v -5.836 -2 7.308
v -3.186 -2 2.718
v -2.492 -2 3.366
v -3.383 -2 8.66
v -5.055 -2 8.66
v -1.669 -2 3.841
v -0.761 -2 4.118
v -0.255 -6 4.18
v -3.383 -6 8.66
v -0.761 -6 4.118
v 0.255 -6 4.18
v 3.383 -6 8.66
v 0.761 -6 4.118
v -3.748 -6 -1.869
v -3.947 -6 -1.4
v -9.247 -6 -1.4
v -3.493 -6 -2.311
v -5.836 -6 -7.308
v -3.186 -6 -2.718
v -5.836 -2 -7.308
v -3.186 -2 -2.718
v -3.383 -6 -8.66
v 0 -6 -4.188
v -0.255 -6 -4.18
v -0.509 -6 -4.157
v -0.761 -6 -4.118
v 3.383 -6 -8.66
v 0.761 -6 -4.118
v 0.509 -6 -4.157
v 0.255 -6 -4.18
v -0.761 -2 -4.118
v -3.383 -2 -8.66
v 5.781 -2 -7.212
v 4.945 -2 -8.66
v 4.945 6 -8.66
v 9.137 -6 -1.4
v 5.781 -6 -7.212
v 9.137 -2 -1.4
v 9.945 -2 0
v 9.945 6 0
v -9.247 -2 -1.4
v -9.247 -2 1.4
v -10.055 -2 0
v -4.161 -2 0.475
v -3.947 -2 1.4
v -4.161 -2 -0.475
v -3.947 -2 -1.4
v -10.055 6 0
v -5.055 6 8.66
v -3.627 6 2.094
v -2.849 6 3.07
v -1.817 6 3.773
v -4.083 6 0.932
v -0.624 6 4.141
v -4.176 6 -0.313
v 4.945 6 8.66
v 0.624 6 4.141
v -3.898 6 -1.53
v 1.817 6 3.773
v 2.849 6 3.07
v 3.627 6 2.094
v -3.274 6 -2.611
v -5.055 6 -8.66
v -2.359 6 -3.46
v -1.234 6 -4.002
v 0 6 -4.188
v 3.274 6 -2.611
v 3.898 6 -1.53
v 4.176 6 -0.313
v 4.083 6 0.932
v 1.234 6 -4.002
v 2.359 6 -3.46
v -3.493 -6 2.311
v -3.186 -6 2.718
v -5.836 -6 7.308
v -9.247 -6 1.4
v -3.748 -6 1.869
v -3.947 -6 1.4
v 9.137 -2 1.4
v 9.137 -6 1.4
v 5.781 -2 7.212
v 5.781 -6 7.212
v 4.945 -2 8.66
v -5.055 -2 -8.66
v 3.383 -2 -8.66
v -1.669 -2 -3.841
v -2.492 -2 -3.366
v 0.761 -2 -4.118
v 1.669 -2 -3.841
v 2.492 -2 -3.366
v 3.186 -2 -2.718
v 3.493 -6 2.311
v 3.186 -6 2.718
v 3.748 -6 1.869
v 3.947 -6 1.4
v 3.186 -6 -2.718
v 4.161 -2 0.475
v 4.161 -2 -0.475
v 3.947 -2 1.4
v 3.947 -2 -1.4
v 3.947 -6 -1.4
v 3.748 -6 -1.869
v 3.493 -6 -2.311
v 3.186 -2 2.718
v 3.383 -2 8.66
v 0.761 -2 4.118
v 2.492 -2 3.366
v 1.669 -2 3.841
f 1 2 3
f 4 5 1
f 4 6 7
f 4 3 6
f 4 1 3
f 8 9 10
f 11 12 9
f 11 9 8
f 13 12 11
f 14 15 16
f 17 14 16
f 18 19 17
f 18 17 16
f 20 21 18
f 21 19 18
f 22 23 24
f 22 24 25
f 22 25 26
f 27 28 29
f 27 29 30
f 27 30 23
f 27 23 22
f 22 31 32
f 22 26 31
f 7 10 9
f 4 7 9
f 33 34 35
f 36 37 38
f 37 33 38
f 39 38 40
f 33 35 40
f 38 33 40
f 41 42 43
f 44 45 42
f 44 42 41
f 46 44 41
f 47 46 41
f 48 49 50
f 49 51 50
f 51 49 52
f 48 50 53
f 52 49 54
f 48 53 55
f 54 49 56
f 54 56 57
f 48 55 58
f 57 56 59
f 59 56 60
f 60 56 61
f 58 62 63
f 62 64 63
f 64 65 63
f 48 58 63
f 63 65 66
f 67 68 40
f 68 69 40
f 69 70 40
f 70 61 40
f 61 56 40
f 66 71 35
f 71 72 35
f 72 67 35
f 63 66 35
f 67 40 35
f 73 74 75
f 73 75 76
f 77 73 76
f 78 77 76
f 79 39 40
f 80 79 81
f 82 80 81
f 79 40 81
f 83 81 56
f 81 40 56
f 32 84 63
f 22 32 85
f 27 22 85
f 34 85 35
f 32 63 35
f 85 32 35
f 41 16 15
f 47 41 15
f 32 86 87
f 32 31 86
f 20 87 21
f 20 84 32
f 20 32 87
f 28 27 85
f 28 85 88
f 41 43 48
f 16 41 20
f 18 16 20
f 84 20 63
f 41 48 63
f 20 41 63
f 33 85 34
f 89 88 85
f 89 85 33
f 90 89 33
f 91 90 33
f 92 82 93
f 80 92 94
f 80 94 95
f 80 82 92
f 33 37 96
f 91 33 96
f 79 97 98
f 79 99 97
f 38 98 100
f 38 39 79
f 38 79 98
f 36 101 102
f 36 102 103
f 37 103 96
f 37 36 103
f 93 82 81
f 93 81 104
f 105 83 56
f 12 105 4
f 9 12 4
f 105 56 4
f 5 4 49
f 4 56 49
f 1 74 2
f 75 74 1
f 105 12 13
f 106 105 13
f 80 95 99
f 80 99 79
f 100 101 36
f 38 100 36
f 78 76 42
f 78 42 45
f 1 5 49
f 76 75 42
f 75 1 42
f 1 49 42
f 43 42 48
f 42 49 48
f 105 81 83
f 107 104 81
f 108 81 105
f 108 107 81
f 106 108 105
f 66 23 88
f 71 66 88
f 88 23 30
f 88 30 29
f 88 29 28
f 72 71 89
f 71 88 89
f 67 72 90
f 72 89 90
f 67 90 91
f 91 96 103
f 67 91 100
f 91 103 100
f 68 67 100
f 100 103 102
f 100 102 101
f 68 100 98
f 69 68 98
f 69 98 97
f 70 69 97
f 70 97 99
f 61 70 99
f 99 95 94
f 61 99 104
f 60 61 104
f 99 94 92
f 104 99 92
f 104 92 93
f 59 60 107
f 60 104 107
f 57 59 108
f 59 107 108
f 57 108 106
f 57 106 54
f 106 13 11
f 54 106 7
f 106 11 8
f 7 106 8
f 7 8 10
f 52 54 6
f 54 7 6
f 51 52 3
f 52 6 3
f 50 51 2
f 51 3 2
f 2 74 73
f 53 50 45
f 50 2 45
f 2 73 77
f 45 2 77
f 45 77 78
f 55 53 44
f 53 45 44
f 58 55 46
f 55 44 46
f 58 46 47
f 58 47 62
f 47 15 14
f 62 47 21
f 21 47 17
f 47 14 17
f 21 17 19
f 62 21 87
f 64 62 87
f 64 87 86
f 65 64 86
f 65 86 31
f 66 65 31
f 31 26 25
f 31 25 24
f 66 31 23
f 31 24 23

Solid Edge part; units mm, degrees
sketch "Sketch1" plane through (0, 0, 0) normal (0, -1, 0) x (1, 0, 0)
  line L0 (-5.0552, -8.6603) -> (4.9448, -8.6603)
  line L1 (4.9448, -8.6603) -> (9.9448, 0)
  line L2 (9.9448, 0) -> (4.9448, 8.6603)
  line L3 (4.9448, 8.6603) -> (-5.0552, 8.6603)
  line L4 (-5.0552, 8.6603) -> (-10.0552, 0)
  line L5 (-10.0552, 0) -> (-5.0552, -8.6603)
extrude "Protrusion1" add sketch "Sketch1" along normal mid plane 12
hole "Hole_1" at (0, -6, 0) direction (0, 1, 0) diameter 8.376 end up to next thread major 10 thread length 2
sketch "Sketch2" plane through (-0.0552, -6, 0) normal (0, -1, 0) x (1, 0, 0)
  line L0 (-14.8325, -1.4) -> (22.8043, -1.4)
  line L1 (22.8043, 1.4) -> (22.8043, -1.4)
  line L2 (-14.8325, 1.4) -> (22.8043, 1.4)
  line L3 (-14.8325, 1.4) -> (-14.8325, -1.4)
extrude "ExtrudedCutout_2" cut sketch "Sketch2" against normal blind 4
pattern_circular "Pattern1" count 3 over 360 about axis through (0, -6, 0) along (0, -1, 0) of "ExtrudedCutout_2"
